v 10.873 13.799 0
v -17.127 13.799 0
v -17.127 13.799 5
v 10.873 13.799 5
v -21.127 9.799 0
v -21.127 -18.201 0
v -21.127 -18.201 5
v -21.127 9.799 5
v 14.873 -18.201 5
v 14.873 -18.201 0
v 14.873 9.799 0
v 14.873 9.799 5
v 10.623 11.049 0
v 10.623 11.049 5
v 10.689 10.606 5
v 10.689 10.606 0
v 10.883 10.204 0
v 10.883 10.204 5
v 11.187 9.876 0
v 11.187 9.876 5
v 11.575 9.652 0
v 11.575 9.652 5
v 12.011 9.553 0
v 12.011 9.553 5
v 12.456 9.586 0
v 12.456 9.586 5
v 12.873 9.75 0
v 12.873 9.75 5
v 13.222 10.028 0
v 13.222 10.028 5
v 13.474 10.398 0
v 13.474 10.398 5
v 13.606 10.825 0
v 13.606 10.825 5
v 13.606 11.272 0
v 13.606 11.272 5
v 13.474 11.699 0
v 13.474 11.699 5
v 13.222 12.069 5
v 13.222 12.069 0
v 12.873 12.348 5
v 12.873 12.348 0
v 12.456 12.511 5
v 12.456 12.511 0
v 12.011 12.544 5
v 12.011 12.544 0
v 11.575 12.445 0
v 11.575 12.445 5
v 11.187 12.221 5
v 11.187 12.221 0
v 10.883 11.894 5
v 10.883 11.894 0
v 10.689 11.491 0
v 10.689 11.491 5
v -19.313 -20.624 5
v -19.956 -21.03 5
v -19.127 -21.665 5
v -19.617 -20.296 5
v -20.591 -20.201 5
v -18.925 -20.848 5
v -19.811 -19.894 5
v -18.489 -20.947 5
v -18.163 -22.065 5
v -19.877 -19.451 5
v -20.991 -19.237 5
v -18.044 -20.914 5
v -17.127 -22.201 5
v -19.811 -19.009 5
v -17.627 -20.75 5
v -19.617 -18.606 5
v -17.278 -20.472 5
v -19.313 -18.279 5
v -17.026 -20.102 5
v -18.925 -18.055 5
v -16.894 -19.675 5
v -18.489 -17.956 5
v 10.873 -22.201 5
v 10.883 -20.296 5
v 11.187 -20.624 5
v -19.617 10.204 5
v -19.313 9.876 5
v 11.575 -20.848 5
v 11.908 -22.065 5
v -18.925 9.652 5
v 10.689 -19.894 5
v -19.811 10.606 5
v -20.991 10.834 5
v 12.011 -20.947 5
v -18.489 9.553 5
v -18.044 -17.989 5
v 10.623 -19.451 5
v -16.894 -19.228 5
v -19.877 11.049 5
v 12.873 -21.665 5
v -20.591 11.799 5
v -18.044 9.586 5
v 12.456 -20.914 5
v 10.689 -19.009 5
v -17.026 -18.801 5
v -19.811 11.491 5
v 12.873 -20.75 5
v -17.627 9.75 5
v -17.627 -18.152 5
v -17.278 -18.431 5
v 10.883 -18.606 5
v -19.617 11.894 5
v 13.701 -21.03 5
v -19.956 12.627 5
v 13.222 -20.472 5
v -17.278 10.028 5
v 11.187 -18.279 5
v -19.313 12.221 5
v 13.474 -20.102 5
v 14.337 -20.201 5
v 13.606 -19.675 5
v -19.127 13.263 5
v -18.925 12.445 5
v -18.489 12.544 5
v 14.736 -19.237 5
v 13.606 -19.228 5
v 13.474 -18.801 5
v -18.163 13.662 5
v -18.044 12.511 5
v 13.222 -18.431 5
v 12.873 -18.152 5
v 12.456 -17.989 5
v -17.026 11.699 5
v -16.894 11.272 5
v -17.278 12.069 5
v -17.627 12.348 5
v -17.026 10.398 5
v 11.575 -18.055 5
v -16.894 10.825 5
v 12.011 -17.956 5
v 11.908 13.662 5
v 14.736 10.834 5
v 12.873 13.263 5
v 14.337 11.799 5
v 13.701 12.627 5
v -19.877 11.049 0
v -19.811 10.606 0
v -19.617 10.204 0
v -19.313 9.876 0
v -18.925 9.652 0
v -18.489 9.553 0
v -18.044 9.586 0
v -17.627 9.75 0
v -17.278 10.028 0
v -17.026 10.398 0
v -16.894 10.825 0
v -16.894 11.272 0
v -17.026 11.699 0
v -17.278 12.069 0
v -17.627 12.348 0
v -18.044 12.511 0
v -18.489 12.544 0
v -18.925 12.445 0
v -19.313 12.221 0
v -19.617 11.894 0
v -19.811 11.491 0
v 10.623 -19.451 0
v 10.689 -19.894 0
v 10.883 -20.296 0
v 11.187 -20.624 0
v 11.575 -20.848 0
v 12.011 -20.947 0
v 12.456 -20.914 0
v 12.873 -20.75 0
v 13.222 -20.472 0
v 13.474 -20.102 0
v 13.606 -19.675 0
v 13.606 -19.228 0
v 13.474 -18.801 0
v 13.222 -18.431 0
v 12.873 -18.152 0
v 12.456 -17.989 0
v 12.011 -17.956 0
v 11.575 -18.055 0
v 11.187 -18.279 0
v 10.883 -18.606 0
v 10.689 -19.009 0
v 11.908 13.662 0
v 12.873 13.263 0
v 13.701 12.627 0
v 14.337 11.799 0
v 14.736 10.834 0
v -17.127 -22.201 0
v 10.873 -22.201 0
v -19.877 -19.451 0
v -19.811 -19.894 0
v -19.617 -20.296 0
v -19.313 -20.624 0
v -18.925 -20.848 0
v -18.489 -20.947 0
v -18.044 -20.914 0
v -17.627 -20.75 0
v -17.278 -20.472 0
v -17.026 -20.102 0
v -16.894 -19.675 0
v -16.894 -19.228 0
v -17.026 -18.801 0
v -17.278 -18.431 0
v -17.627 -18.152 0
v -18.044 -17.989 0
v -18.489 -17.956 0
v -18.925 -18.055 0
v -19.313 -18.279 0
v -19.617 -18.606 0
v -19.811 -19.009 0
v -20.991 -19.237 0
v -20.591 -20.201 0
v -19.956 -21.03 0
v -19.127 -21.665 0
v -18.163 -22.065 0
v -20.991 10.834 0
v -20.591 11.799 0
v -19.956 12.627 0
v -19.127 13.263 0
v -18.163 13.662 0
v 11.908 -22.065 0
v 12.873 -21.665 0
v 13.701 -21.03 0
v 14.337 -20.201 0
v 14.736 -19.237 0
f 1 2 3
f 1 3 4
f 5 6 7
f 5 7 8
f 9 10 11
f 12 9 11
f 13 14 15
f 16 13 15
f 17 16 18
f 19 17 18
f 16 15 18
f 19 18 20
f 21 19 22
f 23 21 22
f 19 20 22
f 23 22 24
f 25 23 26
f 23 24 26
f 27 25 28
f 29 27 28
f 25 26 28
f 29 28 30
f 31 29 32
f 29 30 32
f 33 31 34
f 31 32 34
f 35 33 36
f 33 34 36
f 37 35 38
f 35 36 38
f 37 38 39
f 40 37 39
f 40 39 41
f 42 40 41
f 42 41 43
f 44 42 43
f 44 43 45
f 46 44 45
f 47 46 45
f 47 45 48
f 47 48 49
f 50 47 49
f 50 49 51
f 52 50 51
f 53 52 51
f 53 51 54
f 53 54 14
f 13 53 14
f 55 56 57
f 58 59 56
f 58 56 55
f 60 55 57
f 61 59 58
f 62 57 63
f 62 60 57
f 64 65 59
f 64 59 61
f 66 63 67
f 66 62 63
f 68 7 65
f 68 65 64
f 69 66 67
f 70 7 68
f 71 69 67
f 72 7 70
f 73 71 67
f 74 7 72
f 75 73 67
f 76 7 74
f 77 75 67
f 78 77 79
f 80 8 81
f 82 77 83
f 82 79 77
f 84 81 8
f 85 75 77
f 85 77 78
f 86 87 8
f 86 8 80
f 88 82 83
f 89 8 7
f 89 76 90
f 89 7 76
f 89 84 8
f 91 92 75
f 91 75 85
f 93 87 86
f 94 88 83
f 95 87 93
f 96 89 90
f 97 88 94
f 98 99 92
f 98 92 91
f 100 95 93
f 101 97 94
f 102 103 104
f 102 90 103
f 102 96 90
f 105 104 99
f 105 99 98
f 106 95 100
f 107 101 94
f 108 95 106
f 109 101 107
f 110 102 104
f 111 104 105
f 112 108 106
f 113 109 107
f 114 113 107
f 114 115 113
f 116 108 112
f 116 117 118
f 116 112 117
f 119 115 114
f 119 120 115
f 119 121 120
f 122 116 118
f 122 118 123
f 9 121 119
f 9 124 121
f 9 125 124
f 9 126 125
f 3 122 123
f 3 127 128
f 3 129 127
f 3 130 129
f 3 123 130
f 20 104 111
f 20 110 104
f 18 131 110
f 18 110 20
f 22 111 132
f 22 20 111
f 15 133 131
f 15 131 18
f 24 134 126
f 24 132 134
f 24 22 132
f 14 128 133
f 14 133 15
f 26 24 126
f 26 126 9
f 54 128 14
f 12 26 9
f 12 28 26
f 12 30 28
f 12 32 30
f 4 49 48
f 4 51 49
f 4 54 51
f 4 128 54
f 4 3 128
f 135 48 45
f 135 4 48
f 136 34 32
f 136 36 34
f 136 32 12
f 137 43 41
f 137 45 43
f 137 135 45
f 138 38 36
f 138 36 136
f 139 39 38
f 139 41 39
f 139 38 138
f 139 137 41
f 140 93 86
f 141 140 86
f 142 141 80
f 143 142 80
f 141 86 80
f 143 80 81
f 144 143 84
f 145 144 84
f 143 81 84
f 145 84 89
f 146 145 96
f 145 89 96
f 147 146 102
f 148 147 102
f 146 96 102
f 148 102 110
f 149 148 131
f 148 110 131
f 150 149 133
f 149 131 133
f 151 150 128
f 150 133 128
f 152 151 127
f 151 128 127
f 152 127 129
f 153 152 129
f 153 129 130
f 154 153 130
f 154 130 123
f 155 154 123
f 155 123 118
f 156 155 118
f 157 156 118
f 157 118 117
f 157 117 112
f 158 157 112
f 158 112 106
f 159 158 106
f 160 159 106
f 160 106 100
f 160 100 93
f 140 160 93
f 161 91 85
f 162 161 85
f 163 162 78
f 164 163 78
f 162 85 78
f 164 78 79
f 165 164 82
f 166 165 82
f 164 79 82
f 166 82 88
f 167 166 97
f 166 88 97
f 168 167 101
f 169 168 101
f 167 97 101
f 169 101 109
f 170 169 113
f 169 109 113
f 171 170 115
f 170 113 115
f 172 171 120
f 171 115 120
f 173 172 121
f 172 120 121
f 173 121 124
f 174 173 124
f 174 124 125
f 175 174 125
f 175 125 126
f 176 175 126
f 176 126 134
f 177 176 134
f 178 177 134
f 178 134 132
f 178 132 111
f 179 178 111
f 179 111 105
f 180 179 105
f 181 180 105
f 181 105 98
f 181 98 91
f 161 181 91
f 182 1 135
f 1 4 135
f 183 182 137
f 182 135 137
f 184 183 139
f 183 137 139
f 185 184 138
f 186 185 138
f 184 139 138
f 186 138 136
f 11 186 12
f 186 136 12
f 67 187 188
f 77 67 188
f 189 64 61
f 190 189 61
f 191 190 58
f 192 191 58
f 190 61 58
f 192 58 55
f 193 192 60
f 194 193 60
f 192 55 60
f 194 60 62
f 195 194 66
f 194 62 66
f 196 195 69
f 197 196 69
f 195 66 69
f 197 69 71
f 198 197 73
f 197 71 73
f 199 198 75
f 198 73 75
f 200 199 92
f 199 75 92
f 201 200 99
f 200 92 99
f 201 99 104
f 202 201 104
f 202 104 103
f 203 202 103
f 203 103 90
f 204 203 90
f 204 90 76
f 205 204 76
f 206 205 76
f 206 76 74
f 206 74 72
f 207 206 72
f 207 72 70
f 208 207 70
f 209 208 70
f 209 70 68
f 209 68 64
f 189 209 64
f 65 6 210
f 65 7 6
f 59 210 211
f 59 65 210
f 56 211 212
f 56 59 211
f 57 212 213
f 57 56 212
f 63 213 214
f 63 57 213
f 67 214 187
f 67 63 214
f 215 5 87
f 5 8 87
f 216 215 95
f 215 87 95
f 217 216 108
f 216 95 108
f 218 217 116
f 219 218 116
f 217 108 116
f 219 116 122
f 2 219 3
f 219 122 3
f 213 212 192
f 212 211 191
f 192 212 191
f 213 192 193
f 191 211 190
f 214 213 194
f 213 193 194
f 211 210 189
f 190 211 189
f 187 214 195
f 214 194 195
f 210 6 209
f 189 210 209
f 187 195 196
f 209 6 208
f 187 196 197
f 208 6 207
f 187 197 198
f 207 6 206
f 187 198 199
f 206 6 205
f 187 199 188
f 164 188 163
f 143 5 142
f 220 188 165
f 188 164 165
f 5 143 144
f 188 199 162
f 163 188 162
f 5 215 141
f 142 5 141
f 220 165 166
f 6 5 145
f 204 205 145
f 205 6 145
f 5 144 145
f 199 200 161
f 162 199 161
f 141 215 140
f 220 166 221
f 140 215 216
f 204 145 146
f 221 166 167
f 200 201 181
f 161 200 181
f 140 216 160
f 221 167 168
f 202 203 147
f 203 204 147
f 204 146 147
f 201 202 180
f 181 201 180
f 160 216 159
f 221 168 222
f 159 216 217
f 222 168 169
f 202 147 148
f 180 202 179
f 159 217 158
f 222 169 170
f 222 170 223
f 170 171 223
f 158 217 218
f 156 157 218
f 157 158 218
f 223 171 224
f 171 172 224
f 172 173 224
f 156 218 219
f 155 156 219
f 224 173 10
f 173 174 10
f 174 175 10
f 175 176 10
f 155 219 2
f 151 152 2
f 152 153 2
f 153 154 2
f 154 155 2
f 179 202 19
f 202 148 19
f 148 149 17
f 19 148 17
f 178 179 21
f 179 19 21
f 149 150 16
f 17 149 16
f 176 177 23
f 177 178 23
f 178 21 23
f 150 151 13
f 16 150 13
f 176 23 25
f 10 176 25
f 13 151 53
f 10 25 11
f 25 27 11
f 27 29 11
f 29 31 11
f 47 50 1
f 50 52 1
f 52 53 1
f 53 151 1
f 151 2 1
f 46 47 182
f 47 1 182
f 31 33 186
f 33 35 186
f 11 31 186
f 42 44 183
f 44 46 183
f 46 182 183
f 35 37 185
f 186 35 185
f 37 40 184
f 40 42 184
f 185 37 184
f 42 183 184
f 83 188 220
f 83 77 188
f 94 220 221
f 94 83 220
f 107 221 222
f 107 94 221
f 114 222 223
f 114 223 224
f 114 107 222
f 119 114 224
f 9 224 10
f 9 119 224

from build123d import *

# Parameters (mm, degrees)
F0_W     = 36
F0_H     = 36
F1_DEPTH = 5
F2_D     = 3
F3_R     = 4


with BuildPart() as f1:
    # F0 (on Top) → F1 (new body)
    with BuildSketch(Plane.XY):
        with Locations((-3.1273178756, -4.2013906179)):
            Rectangle(F0_W, F0_H)
    extrude(amount=F1_DEPTH)

    # F2 (through all)
    with Locations(Plane(origin=(0, 0, 0), x_dir=(1, 0, 0), z_dir=(0, 0, -1))):
        with Locations((12.1226821244, -11.0486093821), (-18.3773178756, -11.0486093821), (-18.3773178756, 19.4513906179), (12.1226821244, 19.4513906179)):
            Hole(F2_D / 2)

    # F3
    f3_edges = [f1.edges().sort_by_distance(p)[0] for p in [
        (14.872682, -22.201391, 2.5),
        (14.872682, 13.798609, 2.5),
        (-21.127318, -22.201391, 2.5),
        (-21.127318, 13.798609, 2.5),
    ]]
    fillet(f3_edges, radius=F3_R)


solid = f1.part
